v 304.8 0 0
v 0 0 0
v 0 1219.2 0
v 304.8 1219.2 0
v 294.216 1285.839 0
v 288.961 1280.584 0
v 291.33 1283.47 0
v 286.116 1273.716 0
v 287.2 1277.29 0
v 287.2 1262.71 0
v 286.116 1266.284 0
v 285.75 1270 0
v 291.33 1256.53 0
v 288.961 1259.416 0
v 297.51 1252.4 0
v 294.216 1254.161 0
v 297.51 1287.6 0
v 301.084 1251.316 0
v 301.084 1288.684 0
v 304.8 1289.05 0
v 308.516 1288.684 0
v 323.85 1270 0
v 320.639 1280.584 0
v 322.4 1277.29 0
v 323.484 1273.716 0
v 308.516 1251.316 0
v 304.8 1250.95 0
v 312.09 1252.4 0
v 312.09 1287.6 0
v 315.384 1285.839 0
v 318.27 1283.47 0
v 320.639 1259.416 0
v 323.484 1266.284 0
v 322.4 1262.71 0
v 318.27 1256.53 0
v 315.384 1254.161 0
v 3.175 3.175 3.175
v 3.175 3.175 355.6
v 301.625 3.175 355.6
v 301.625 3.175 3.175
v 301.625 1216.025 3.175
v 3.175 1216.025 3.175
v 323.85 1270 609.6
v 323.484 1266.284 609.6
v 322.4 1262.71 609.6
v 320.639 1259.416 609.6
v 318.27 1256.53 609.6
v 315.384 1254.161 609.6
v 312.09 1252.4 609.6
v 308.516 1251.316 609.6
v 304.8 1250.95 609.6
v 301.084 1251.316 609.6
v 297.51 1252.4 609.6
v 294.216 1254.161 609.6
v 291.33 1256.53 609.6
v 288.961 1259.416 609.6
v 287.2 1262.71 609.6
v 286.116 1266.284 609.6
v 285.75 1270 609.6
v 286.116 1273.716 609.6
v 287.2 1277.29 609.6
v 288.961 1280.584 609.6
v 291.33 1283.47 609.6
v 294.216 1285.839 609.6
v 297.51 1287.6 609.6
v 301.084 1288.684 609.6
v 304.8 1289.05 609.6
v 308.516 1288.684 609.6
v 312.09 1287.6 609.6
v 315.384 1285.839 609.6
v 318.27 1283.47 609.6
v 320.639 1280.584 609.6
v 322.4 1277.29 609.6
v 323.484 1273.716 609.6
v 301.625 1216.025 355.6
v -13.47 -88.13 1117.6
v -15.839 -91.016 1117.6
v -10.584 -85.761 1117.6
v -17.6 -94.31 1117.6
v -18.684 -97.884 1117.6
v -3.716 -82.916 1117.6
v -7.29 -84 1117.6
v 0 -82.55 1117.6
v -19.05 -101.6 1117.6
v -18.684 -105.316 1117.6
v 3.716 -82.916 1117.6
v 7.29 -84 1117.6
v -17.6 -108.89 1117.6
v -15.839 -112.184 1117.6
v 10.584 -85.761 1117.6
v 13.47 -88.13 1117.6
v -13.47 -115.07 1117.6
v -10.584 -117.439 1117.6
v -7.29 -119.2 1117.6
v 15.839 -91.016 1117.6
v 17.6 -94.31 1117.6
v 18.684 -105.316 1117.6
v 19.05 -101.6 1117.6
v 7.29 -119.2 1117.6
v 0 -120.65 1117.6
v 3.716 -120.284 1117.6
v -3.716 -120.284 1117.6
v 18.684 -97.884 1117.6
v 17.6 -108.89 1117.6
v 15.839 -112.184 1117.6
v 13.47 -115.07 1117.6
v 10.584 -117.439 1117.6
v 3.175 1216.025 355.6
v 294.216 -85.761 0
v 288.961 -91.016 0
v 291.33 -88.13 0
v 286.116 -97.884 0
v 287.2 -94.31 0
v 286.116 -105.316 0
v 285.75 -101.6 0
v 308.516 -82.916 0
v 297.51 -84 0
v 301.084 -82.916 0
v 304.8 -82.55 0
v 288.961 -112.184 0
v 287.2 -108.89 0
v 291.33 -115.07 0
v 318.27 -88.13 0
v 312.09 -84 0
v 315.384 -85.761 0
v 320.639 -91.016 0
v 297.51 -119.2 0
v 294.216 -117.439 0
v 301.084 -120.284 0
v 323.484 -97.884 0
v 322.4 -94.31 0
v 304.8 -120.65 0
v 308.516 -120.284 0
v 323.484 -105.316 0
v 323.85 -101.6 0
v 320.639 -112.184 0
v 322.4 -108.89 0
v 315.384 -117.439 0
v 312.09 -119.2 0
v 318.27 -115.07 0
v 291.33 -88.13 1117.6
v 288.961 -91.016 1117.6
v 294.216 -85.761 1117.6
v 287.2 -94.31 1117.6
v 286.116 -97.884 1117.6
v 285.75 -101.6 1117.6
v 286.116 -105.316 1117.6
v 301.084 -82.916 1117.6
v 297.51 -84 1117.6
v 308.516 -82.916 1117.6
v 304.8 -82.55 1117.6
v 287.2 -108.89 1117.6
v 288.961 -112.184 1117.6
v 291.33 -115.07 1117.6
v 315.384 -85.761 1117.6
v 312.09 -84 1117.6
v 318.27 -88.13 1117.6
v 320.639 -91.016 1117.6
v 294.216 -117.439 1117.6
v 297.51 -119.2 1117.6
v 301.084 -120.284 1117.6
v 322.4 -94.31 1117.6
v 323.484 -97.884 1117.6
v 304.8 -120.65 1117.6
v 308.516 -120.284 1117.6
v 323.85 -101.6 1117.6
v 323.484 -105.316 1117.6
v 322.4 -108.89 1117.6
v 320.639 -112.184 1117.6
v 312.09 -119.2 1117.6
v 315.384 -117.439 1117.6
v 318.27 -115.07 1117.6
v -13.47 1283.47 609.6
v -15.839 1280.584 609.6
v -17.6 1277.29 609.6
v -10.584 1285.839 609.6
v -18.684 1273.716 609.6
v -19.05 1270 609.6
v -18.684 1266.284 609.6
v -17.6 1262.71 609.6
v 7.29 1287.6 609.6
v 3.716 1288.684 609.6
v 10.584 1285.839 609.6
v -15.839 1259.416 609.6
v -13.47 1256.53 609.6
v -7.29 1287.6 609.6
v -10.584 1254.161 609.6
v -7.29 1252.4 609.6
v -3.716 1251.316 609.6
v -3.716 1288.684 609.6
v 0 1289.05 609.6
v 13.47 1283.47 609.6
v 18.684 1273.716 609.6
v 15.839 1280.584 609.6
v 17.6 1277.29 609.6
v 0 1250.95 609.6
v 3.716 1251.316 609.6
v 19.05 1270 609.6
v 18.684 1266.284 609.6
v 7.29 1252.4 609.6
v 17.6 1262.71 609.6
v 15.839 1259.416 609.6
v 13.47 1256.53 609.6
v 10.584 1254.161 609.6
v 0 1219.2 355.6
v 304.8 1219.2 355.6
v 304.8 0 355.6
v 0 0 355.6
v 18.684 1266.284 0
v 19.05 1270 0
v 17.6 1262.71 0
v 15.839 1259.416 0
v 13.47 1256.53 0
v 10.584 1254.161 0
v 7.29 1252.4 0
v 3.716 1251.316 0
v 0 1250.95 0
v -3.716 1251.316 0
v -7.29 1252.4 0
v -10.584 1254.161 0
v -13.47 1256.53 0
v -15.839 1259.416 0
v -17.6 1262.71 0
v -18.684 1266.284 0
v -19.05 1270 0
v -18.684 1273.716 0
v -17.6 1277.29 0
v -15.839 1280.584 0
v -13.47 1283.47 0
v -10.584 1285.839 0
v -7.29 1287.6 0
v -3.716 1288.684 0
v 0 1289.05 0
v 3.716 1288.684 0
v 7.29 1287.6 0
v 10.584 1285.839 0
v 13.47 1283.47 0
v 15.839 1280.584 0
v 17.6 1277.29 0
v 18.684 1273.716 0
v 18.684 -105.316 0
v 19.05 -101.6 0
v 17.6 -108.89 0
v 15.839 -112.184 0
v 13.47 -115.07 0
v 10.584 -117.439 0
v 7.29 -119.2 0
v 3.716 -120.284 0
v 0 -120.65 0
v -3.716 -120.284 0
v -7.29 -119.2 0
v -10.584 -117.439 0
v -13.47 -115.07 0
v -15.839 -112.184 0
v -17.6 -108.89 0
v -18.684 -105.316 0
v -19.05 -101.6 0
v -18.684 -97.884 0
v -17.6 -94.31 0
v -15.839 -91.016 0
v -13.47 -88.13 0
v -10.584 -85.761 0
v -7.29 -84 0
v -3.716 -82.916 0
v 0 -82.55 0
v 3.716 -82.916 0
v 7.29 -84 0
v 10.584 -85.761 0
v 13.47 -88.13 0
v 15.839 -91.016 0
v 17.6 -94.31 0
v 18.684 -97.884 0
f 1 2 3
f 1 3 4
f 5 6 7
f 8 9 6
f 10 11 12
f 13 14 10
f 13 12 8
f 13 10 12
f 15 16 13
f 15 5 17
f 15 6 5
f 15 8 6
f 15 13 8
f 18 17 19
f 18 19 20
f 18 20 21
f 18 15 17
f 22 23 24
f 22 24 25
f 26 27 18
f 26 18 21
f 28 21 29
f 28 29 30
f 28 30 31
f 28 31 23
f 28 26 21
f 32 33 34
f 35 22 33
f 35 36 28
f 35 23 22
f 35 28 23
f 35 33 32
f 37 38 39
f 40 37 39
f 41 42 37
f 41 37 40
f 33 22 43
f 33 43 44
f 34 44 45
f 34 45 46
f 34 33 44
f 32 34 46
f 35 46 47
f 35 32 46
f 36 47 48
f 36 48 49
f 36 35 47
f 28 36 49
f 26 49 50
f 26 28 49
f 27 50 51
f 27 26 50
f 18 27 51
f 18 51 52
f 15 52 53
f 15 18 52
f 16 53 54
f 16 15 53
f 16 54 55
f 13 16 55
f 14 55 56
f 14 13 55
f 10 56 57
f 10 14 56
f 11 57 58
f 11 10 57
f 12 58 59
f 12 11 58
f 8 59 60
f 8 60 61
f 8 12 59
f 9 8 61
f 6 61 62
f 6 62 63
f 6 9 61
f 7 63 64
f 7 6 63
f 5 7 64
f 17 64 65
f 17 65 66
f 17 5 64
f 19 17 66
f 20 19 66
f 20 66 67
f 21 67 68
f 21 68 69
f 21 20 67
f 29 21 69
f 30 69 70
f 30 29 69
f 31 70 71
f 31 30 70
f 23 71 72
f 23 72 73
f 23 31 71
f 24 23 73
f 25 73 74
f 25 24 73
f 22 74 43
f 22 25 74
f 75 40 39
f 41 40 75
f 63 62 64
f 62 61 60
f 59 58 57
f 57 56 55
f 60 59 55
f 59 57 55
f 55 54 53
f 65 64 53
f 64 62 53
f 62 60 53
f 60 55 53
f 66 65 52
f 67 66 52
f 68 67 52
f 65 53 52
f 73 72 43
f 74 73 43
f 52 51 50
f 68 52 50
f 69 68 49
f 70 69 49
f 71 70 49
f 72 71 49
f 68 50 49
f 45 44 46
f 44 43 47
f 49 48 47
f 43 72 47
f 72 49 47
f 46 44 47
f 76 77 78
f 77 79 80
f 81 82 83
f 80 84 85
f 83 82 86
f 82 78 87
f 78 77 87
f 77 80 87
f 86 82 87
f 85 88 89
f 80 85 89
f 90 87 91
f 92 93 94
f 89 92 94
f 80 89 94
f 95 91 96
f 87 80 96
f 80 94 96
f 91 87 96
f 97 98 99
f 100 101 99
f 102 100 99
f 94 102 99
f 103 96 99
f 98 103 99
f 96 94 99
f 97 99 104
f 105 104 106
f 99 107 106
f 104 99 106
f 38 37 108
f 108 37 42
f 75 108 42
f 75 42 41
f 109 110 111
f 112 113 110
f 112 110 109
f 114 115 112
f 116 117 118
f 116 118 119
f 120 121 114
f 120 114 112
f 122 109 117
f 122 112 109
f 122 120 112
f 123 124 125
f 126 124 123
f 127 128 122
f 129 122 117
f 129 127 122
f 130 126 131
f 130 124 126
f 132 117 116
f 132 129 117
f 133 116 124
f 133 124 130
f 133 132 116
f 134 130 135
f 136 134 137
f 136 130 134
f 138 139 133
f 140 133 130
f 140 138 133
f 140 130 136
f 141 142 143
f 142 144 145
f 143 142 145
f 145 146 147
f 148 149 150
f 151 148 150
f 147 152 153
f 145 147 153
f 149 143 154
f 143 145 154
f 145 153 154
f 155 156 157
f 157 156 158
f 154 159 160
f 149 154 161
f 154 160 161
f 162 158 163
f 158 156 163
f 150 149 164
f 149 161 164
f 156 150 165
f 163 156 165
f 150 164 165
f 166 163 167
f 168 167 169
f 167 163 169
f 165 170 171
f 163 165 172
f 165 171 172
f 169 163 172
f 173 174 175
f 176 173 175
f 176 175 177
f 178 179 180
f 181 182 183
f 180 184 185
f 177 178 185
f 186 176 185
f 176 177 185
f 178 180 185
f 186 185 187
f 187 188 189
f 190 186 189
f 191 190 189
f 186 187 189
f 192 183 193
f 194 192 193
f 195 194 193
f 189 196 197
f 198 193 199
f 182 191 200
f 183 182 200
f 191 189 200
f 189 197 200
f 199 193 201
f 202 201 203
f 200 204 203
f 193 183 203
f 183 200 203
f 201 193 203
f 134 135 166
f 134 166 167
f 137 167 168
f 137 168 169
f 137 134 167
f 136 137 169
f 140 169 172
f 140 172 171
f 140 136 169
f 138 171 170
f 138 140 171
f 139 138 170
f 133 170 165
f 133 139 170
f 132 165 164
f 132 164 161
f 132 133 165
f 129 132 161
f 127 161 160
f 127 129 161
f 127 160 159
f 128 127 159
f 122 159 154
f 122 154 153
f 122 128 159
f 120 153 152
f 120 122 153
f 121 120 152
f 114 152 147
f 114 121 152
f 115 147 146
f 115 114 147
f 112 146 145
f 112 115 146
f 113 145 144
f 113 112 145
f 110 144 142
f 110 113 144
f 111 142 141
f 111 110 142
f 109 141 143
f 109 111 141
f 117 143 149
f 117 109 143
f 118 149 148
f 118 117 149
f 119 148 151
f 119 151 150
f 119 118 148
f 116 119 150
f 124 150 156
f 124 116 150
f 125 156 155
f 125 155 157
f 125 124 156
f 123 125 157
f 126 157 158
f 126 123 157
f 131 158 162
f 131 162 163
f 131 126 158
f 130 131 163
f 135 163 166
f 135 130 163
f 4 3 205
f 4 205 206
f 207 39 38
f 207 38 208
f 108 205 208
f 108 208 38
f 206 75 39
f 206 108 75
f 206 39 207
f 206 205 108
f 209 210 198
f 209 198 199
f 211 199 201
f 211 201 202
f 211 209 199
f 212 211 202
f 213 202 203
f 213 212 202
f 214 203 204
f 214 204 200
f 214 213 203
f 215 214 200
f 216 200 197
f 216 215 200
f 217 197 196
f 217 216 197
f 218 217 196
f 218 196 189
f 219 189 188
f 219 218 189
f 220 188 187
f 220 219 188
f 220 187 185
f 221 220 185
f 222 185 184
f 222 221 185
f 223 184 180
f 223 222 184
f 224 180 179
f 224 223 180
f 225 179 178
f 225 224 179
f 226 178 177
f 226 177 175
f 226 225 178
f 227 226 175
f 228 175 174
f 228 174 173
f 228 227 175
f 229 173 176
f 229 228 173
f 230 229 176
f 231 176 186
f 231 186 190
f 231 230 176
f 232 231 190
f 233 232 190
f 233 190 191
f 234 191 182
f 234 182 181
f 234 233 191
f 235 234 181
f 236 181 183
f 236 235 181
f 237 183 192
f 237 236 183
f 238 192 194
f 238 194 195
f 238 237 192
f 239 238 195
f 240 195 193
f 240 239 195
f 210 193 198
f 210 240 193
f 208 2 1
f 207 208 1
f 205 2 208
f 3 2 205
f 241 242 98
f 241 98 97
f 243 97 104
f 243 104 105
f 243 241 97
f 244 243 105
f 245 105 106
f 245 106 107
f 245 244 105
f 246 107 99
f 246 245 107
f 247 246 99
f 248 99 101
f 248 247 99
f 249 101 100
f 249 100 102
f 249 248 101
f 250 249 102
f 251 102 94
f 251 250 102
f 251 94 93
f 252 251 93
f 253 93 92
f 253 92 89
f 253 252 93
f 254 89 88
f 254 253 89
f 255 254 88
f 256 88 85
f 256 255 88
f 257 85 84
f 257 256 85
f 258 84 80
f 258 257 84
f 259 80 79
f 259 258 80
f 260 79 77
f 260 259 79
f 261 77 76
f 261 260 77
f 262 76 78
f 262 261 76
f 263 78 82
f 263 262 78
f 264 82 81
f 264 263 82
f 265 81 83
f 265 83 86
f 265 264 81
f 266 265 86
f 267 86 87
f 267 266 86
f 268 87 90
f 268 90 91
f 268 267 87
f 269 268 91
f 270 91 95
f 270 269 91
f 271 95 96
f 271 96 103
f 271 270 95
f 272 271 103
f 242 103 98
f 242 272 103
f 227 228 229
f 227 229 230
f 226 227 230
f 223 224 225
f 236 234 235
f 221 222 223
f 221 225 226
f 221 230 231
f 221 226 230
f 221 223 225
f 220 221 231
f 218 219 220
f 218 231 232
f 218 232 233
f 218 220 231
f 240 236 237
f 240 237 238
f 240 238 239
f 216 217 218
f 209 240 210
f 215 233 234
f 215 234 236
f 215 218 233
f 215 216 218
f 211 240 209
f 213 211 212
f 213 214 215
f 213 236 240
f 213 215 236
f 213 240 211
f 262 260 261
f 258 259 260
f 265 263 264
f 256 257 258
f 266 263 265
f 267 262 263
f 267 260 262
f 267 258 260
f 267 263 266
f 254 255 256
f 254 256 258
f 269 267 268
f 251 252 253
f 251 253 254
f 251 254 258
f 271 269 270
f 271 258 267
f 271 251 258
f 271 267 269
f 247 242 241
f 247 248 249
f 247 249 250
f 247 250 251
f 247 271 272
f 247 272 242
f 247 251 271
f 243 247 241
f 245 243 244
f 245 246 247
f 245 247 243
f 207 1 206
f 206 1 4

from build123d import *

# Parameters (mm, degrees)
F0_W     = 304.8
F0_H     = 1219.2
F1_DEPTH = 355.6
F2_T     = -3.175
F3_R     = 19.05
F4_DEPTH = 1117.6
F5_R     = 19.05
F6_DEPTH = 609.6


with BuildPart() as f1:
    # F0 (on Top) → F1 (new body)
    with BuildSketch(Plane.XY):
        with Locations((152.4, 609.6)):
            Rectangle(F0_W, F0_H)
    extrude(amount=F1_DEPTH)

    # F2
    f2_openings = [f1.faces().sort_by_distance(p)[0] for p in [
        (152.4, 609.6, 355.6),
    ]]
    offset(amount=F2_T, openings=f2_openings)


with BuildPart() as f4:
    # F3 (on face) → F4 (new body)
    with BuildSketch(Plane(origin=(0, 0, 0), x_dir=(1, 0, 0), z_dir=(0, 0, -1))):
        with Locations((0, 101.6)):
            Circle(F3_R)
        with Locations((304.8, 101.6)):
            Circle(F3_R)
    extrude(amount=-F4_DEPTH)


with BuildPart() as f6:
    # F5 (on face) → F6 (new body)
    with BuildSketch(Plane(origin=(0, 0, 0), x_dir=(1, 0, 0), z_dir=(0, 0, -1))):
        with Locations((0, -1270)):
            Circle(F5_R)
        with Locations((304.8, -1270)):
            Circle(F5_R)
    extrude(amount=-F6_DEPTH)


solid = Compound([f1.part, f4.part, f6.part])
